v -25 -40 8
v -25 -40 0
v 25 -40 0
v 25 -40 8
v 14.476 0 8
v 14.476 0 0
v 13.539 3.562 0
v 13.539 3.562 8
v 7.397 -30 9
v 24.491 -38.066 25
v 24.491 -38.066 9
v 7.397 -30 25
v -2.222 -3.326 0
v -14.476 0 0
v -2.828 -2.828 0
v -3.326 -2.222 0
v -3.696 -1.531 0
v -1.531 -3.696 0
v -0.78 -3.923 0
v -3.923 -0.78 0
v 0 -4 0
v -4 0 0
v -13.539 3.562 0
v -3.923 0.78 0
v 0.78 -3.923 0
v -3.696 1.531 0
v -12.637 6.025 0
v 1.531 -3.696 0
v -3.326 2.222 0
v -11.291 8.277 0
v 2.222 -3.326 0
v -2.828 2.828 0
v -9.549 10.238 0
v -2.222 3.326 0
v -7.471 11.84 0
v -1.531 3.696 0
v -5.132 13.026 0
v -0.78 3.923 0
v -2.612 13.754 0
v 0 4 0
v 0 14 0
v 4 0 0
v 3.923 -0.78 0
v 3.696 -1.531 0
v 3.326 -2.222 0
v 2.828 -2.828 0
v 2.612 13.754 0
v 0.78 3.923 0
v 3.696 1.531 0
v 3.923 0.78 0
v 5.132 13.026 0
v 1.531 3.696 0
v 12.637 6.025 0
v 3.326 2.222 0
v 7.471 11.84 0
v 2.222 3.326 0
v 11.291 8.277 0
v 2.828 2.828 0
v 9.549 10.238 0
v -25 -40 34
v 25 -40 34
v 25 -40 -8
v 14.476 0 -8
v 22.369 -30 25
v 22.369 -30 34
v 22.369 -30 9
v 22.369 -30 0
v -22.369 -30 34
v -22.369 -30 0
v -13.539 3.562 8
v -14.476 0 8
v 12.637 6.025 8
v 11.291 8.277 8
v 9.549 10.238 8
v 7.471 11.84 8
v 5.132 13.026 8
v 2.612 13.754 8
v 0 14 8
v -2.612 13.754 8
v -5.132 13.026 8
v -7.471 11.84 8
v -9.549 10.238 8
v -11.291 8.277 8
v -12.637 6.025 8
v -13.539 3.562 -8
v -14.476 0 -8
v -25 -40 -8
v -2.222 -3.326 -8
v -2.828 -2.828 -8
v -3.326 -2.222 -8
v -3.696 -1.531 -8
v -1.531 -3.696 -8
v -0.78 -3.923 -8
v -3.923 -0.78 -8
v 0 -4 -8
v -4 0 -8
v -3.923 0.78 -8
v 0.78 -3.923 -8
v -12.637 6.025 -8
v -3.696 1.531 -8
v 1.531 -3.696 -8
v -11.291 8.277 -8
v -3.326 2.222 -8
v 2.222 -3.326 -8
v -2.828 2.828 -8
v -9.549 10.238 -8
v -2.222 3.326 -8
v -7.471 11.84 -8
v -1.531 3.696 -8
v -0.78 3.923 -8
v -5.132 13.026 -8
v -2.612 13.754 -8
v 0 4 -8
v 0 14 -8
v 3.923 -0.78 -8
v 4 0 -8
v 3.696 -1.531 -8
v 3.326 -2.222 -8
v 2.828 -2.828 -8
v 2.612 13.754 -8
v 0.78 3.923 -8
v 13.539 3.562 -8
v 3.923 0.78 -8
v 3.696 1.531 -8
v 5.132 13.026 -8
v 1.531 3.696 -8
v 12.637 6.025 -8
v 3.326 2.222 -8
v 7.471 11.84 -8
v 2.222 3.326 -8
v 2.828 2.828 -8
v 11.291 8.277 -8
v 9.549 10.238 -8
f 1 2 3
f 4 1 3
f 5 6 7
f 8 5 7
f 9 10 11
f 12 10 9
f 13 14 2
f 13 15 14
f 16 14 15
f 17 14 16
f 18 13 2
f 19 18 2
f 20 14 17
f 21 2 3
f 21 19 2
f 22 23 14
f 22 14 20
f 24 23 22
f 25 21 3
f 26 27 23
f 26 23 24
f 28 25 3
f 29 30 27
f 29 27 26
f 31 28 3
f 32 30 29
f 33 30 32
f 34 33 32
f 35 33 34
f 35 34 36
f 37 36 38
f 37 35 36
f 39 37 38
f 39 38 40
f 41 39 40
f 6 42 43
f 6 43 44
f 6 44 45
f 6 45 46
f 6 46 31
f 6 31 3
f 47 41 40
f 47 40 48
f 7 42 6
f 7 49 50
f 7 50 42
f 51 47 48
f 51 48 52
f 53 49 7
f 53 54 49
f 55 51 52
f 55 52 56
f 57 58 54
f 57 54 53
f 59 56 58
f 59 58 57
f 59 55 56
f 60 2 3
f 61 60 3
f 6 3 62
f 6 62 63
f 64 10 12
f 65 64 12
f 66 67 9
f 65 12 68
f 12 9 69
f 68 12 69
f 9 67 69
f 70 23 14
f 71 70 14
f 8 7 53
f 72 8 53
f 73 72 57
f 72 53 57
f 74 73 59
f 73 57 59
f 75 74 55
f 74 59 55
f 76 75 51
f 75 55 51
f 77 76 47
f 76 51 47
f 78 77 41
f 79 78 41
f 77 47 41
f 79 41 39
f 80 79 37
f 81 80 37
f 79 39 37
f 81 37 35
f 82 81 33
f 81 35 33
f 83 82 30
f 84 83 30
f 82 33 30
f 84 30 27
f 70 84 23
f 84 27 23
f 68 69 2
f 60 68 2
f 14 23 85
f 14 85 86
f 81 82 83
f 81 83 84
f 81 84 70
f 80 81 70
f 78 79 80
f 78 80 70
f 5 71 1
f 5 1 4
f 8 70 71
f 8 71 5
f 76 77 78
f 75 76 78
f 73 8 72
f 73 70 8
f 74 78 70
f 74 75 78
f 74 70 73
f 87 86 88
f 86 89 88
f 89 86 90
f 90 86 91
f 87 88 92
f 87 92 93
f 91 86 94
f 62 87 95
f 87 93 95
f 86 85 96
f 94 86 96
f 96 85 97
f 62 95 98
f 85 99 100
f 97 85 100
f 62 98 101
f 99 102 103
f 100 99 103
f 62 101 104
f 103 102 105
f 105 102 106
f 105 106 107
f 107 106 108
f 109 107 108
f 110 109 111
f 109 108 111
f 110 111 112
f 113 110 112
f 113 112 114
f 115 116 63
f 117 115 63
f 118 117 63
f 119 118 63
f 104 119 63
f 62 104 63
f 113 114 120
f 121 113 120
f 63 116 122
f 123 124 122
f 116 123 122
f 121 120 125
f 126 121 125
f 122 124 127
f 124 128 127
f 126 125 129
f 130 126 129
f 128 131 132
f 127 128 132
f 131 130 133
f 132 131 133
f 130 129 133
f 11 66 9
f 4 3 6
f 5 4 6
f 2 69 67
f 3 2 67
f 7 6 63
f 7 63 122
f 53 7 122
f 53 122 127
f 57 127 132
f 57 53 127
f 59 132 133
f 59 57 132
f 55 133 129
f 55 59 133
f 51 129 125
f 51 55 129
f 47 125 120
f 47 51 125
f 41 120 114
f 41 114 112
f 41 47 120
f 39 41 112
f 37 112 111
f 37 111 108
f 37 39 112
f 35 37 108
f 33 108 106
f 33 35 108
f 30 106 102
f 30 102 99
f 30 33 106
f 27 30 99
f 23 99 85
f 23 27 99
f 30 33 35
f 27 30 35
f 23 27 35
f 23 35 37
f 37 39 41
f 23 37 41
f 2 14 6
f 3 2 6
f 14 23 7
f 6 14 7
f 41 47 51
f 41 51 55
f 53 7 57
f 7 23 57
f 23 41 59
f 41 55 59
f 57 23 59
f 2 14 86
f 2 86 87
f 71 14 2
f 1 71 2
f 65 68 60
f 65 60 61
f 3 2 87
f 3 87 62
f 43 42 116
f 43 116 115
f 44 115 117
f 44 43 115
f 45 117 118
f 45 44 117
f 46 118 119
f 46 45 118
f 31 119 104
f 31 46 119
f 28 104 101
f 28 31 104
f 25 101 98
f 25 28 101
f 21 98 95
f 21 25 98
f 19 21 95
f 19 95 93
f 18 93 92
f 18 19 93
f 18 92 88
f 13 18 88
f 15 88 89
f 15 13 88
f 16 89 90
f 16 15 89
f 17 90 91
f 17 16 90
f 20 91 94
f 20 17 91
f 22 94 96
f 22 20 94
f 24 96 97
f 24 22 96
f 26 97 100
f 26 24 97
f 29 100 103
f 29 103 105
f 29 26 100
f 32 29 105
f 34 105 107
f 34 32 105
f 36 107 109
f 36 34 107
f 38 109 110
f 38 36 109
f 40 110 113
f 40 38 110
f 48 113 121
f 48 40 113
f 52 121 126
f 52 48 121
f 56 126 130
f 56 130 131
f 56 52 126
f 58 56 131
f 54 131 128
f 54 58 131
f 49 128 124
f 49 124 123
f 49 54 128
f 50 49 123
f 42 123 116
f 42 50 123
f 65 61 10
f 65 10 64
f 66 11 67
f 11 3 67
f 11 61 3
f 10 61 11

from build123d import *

# Parameters (mm, degrees)
F1_DEPTH = 8
F3_DEPTH = 8
F5_DEPTH = 34
F6_W     = 16.659708
F6_H     = 16
F6_W_2   = 8.340292
F7_ANGLE = -50


with BuildPart() as f1:
    # F0 (on Top) → F1 (new body)
    with BuildSketch(Plane.XY):
        with BuildLine():
            Line((14.476408, 0), (13.53927, 3.562044))
            ThreePointArc((13.53927, 3.562044), (0, 14), (-13.53927, 3.562044))
            Line((-13.53927, 3.562044), (-14.476408, 0))
            Line((-14.476408, 0), (-25, -40))
            Line((-25, -40), (25, -40))
            Line((25, -40), (14.476408, 0))
        make_face()
        with BuildLine():
            ThreePointArc((-4, 0), (0, 4), (4, 0))
            ThreePointArc((4, 0), (0, -4), (-4, 0))
        make_face(mode=Mode.SUBTRACT)
    extrude(amount=-F1_DEPTH)


with BuildPart() as f3:
    # F2 (on Top) → F3 (new body)
    with BuildSketch(Plane.XY):
        with BuildLine():
            Line((14.476408, 0), (13.53927, 3.562044))
            ThreePointArc((13.53927, 3.562044), (0, 14), (-13.53927, 3.562044))
            Line((-13.53927, 3.562044), (-14.476408, 0))
            Line((-14.476408, 0), (-25, -40))
            Line((-25, -40), (25, -40))
            Line((25, -40), (14.476408, 0))
        make_face()
    extrude(amount=F3_DEPTH)


with BuildPart() as f5:
    # F4 (on face) → F5 (new body)
    with BuildSketch(Plane.XY):
        Polygon((-22.369102, -30), (-25, -40), (25, -40), (22.369102, -30), align=None)
    extrude(amount=F5_DEPTH)

    # F6 (on face) → F7 (revolve, cut)
    with BuildSketch(Plane(origin=(13.53927, 3.562044, 0), x_dir=(-0.254432, 0.967091, 0), z_dir=(0.967091, 0.254432, 0))):
        with Locations((-26.374277, 17)):
            Rectangle(F6_W, F6_H)
        with Locations((-38.874277, 17)):
            Rectangle(F6_W_2, F6_H)
    revolve(axis=Axis((24.491137, -38.065819, 17), (0, 0, -1)), revolution_arc=F7_ANGLE, mode=Mode.SUBTRACT)


solid = Compound([f1.part, f3.part, f5.part])
